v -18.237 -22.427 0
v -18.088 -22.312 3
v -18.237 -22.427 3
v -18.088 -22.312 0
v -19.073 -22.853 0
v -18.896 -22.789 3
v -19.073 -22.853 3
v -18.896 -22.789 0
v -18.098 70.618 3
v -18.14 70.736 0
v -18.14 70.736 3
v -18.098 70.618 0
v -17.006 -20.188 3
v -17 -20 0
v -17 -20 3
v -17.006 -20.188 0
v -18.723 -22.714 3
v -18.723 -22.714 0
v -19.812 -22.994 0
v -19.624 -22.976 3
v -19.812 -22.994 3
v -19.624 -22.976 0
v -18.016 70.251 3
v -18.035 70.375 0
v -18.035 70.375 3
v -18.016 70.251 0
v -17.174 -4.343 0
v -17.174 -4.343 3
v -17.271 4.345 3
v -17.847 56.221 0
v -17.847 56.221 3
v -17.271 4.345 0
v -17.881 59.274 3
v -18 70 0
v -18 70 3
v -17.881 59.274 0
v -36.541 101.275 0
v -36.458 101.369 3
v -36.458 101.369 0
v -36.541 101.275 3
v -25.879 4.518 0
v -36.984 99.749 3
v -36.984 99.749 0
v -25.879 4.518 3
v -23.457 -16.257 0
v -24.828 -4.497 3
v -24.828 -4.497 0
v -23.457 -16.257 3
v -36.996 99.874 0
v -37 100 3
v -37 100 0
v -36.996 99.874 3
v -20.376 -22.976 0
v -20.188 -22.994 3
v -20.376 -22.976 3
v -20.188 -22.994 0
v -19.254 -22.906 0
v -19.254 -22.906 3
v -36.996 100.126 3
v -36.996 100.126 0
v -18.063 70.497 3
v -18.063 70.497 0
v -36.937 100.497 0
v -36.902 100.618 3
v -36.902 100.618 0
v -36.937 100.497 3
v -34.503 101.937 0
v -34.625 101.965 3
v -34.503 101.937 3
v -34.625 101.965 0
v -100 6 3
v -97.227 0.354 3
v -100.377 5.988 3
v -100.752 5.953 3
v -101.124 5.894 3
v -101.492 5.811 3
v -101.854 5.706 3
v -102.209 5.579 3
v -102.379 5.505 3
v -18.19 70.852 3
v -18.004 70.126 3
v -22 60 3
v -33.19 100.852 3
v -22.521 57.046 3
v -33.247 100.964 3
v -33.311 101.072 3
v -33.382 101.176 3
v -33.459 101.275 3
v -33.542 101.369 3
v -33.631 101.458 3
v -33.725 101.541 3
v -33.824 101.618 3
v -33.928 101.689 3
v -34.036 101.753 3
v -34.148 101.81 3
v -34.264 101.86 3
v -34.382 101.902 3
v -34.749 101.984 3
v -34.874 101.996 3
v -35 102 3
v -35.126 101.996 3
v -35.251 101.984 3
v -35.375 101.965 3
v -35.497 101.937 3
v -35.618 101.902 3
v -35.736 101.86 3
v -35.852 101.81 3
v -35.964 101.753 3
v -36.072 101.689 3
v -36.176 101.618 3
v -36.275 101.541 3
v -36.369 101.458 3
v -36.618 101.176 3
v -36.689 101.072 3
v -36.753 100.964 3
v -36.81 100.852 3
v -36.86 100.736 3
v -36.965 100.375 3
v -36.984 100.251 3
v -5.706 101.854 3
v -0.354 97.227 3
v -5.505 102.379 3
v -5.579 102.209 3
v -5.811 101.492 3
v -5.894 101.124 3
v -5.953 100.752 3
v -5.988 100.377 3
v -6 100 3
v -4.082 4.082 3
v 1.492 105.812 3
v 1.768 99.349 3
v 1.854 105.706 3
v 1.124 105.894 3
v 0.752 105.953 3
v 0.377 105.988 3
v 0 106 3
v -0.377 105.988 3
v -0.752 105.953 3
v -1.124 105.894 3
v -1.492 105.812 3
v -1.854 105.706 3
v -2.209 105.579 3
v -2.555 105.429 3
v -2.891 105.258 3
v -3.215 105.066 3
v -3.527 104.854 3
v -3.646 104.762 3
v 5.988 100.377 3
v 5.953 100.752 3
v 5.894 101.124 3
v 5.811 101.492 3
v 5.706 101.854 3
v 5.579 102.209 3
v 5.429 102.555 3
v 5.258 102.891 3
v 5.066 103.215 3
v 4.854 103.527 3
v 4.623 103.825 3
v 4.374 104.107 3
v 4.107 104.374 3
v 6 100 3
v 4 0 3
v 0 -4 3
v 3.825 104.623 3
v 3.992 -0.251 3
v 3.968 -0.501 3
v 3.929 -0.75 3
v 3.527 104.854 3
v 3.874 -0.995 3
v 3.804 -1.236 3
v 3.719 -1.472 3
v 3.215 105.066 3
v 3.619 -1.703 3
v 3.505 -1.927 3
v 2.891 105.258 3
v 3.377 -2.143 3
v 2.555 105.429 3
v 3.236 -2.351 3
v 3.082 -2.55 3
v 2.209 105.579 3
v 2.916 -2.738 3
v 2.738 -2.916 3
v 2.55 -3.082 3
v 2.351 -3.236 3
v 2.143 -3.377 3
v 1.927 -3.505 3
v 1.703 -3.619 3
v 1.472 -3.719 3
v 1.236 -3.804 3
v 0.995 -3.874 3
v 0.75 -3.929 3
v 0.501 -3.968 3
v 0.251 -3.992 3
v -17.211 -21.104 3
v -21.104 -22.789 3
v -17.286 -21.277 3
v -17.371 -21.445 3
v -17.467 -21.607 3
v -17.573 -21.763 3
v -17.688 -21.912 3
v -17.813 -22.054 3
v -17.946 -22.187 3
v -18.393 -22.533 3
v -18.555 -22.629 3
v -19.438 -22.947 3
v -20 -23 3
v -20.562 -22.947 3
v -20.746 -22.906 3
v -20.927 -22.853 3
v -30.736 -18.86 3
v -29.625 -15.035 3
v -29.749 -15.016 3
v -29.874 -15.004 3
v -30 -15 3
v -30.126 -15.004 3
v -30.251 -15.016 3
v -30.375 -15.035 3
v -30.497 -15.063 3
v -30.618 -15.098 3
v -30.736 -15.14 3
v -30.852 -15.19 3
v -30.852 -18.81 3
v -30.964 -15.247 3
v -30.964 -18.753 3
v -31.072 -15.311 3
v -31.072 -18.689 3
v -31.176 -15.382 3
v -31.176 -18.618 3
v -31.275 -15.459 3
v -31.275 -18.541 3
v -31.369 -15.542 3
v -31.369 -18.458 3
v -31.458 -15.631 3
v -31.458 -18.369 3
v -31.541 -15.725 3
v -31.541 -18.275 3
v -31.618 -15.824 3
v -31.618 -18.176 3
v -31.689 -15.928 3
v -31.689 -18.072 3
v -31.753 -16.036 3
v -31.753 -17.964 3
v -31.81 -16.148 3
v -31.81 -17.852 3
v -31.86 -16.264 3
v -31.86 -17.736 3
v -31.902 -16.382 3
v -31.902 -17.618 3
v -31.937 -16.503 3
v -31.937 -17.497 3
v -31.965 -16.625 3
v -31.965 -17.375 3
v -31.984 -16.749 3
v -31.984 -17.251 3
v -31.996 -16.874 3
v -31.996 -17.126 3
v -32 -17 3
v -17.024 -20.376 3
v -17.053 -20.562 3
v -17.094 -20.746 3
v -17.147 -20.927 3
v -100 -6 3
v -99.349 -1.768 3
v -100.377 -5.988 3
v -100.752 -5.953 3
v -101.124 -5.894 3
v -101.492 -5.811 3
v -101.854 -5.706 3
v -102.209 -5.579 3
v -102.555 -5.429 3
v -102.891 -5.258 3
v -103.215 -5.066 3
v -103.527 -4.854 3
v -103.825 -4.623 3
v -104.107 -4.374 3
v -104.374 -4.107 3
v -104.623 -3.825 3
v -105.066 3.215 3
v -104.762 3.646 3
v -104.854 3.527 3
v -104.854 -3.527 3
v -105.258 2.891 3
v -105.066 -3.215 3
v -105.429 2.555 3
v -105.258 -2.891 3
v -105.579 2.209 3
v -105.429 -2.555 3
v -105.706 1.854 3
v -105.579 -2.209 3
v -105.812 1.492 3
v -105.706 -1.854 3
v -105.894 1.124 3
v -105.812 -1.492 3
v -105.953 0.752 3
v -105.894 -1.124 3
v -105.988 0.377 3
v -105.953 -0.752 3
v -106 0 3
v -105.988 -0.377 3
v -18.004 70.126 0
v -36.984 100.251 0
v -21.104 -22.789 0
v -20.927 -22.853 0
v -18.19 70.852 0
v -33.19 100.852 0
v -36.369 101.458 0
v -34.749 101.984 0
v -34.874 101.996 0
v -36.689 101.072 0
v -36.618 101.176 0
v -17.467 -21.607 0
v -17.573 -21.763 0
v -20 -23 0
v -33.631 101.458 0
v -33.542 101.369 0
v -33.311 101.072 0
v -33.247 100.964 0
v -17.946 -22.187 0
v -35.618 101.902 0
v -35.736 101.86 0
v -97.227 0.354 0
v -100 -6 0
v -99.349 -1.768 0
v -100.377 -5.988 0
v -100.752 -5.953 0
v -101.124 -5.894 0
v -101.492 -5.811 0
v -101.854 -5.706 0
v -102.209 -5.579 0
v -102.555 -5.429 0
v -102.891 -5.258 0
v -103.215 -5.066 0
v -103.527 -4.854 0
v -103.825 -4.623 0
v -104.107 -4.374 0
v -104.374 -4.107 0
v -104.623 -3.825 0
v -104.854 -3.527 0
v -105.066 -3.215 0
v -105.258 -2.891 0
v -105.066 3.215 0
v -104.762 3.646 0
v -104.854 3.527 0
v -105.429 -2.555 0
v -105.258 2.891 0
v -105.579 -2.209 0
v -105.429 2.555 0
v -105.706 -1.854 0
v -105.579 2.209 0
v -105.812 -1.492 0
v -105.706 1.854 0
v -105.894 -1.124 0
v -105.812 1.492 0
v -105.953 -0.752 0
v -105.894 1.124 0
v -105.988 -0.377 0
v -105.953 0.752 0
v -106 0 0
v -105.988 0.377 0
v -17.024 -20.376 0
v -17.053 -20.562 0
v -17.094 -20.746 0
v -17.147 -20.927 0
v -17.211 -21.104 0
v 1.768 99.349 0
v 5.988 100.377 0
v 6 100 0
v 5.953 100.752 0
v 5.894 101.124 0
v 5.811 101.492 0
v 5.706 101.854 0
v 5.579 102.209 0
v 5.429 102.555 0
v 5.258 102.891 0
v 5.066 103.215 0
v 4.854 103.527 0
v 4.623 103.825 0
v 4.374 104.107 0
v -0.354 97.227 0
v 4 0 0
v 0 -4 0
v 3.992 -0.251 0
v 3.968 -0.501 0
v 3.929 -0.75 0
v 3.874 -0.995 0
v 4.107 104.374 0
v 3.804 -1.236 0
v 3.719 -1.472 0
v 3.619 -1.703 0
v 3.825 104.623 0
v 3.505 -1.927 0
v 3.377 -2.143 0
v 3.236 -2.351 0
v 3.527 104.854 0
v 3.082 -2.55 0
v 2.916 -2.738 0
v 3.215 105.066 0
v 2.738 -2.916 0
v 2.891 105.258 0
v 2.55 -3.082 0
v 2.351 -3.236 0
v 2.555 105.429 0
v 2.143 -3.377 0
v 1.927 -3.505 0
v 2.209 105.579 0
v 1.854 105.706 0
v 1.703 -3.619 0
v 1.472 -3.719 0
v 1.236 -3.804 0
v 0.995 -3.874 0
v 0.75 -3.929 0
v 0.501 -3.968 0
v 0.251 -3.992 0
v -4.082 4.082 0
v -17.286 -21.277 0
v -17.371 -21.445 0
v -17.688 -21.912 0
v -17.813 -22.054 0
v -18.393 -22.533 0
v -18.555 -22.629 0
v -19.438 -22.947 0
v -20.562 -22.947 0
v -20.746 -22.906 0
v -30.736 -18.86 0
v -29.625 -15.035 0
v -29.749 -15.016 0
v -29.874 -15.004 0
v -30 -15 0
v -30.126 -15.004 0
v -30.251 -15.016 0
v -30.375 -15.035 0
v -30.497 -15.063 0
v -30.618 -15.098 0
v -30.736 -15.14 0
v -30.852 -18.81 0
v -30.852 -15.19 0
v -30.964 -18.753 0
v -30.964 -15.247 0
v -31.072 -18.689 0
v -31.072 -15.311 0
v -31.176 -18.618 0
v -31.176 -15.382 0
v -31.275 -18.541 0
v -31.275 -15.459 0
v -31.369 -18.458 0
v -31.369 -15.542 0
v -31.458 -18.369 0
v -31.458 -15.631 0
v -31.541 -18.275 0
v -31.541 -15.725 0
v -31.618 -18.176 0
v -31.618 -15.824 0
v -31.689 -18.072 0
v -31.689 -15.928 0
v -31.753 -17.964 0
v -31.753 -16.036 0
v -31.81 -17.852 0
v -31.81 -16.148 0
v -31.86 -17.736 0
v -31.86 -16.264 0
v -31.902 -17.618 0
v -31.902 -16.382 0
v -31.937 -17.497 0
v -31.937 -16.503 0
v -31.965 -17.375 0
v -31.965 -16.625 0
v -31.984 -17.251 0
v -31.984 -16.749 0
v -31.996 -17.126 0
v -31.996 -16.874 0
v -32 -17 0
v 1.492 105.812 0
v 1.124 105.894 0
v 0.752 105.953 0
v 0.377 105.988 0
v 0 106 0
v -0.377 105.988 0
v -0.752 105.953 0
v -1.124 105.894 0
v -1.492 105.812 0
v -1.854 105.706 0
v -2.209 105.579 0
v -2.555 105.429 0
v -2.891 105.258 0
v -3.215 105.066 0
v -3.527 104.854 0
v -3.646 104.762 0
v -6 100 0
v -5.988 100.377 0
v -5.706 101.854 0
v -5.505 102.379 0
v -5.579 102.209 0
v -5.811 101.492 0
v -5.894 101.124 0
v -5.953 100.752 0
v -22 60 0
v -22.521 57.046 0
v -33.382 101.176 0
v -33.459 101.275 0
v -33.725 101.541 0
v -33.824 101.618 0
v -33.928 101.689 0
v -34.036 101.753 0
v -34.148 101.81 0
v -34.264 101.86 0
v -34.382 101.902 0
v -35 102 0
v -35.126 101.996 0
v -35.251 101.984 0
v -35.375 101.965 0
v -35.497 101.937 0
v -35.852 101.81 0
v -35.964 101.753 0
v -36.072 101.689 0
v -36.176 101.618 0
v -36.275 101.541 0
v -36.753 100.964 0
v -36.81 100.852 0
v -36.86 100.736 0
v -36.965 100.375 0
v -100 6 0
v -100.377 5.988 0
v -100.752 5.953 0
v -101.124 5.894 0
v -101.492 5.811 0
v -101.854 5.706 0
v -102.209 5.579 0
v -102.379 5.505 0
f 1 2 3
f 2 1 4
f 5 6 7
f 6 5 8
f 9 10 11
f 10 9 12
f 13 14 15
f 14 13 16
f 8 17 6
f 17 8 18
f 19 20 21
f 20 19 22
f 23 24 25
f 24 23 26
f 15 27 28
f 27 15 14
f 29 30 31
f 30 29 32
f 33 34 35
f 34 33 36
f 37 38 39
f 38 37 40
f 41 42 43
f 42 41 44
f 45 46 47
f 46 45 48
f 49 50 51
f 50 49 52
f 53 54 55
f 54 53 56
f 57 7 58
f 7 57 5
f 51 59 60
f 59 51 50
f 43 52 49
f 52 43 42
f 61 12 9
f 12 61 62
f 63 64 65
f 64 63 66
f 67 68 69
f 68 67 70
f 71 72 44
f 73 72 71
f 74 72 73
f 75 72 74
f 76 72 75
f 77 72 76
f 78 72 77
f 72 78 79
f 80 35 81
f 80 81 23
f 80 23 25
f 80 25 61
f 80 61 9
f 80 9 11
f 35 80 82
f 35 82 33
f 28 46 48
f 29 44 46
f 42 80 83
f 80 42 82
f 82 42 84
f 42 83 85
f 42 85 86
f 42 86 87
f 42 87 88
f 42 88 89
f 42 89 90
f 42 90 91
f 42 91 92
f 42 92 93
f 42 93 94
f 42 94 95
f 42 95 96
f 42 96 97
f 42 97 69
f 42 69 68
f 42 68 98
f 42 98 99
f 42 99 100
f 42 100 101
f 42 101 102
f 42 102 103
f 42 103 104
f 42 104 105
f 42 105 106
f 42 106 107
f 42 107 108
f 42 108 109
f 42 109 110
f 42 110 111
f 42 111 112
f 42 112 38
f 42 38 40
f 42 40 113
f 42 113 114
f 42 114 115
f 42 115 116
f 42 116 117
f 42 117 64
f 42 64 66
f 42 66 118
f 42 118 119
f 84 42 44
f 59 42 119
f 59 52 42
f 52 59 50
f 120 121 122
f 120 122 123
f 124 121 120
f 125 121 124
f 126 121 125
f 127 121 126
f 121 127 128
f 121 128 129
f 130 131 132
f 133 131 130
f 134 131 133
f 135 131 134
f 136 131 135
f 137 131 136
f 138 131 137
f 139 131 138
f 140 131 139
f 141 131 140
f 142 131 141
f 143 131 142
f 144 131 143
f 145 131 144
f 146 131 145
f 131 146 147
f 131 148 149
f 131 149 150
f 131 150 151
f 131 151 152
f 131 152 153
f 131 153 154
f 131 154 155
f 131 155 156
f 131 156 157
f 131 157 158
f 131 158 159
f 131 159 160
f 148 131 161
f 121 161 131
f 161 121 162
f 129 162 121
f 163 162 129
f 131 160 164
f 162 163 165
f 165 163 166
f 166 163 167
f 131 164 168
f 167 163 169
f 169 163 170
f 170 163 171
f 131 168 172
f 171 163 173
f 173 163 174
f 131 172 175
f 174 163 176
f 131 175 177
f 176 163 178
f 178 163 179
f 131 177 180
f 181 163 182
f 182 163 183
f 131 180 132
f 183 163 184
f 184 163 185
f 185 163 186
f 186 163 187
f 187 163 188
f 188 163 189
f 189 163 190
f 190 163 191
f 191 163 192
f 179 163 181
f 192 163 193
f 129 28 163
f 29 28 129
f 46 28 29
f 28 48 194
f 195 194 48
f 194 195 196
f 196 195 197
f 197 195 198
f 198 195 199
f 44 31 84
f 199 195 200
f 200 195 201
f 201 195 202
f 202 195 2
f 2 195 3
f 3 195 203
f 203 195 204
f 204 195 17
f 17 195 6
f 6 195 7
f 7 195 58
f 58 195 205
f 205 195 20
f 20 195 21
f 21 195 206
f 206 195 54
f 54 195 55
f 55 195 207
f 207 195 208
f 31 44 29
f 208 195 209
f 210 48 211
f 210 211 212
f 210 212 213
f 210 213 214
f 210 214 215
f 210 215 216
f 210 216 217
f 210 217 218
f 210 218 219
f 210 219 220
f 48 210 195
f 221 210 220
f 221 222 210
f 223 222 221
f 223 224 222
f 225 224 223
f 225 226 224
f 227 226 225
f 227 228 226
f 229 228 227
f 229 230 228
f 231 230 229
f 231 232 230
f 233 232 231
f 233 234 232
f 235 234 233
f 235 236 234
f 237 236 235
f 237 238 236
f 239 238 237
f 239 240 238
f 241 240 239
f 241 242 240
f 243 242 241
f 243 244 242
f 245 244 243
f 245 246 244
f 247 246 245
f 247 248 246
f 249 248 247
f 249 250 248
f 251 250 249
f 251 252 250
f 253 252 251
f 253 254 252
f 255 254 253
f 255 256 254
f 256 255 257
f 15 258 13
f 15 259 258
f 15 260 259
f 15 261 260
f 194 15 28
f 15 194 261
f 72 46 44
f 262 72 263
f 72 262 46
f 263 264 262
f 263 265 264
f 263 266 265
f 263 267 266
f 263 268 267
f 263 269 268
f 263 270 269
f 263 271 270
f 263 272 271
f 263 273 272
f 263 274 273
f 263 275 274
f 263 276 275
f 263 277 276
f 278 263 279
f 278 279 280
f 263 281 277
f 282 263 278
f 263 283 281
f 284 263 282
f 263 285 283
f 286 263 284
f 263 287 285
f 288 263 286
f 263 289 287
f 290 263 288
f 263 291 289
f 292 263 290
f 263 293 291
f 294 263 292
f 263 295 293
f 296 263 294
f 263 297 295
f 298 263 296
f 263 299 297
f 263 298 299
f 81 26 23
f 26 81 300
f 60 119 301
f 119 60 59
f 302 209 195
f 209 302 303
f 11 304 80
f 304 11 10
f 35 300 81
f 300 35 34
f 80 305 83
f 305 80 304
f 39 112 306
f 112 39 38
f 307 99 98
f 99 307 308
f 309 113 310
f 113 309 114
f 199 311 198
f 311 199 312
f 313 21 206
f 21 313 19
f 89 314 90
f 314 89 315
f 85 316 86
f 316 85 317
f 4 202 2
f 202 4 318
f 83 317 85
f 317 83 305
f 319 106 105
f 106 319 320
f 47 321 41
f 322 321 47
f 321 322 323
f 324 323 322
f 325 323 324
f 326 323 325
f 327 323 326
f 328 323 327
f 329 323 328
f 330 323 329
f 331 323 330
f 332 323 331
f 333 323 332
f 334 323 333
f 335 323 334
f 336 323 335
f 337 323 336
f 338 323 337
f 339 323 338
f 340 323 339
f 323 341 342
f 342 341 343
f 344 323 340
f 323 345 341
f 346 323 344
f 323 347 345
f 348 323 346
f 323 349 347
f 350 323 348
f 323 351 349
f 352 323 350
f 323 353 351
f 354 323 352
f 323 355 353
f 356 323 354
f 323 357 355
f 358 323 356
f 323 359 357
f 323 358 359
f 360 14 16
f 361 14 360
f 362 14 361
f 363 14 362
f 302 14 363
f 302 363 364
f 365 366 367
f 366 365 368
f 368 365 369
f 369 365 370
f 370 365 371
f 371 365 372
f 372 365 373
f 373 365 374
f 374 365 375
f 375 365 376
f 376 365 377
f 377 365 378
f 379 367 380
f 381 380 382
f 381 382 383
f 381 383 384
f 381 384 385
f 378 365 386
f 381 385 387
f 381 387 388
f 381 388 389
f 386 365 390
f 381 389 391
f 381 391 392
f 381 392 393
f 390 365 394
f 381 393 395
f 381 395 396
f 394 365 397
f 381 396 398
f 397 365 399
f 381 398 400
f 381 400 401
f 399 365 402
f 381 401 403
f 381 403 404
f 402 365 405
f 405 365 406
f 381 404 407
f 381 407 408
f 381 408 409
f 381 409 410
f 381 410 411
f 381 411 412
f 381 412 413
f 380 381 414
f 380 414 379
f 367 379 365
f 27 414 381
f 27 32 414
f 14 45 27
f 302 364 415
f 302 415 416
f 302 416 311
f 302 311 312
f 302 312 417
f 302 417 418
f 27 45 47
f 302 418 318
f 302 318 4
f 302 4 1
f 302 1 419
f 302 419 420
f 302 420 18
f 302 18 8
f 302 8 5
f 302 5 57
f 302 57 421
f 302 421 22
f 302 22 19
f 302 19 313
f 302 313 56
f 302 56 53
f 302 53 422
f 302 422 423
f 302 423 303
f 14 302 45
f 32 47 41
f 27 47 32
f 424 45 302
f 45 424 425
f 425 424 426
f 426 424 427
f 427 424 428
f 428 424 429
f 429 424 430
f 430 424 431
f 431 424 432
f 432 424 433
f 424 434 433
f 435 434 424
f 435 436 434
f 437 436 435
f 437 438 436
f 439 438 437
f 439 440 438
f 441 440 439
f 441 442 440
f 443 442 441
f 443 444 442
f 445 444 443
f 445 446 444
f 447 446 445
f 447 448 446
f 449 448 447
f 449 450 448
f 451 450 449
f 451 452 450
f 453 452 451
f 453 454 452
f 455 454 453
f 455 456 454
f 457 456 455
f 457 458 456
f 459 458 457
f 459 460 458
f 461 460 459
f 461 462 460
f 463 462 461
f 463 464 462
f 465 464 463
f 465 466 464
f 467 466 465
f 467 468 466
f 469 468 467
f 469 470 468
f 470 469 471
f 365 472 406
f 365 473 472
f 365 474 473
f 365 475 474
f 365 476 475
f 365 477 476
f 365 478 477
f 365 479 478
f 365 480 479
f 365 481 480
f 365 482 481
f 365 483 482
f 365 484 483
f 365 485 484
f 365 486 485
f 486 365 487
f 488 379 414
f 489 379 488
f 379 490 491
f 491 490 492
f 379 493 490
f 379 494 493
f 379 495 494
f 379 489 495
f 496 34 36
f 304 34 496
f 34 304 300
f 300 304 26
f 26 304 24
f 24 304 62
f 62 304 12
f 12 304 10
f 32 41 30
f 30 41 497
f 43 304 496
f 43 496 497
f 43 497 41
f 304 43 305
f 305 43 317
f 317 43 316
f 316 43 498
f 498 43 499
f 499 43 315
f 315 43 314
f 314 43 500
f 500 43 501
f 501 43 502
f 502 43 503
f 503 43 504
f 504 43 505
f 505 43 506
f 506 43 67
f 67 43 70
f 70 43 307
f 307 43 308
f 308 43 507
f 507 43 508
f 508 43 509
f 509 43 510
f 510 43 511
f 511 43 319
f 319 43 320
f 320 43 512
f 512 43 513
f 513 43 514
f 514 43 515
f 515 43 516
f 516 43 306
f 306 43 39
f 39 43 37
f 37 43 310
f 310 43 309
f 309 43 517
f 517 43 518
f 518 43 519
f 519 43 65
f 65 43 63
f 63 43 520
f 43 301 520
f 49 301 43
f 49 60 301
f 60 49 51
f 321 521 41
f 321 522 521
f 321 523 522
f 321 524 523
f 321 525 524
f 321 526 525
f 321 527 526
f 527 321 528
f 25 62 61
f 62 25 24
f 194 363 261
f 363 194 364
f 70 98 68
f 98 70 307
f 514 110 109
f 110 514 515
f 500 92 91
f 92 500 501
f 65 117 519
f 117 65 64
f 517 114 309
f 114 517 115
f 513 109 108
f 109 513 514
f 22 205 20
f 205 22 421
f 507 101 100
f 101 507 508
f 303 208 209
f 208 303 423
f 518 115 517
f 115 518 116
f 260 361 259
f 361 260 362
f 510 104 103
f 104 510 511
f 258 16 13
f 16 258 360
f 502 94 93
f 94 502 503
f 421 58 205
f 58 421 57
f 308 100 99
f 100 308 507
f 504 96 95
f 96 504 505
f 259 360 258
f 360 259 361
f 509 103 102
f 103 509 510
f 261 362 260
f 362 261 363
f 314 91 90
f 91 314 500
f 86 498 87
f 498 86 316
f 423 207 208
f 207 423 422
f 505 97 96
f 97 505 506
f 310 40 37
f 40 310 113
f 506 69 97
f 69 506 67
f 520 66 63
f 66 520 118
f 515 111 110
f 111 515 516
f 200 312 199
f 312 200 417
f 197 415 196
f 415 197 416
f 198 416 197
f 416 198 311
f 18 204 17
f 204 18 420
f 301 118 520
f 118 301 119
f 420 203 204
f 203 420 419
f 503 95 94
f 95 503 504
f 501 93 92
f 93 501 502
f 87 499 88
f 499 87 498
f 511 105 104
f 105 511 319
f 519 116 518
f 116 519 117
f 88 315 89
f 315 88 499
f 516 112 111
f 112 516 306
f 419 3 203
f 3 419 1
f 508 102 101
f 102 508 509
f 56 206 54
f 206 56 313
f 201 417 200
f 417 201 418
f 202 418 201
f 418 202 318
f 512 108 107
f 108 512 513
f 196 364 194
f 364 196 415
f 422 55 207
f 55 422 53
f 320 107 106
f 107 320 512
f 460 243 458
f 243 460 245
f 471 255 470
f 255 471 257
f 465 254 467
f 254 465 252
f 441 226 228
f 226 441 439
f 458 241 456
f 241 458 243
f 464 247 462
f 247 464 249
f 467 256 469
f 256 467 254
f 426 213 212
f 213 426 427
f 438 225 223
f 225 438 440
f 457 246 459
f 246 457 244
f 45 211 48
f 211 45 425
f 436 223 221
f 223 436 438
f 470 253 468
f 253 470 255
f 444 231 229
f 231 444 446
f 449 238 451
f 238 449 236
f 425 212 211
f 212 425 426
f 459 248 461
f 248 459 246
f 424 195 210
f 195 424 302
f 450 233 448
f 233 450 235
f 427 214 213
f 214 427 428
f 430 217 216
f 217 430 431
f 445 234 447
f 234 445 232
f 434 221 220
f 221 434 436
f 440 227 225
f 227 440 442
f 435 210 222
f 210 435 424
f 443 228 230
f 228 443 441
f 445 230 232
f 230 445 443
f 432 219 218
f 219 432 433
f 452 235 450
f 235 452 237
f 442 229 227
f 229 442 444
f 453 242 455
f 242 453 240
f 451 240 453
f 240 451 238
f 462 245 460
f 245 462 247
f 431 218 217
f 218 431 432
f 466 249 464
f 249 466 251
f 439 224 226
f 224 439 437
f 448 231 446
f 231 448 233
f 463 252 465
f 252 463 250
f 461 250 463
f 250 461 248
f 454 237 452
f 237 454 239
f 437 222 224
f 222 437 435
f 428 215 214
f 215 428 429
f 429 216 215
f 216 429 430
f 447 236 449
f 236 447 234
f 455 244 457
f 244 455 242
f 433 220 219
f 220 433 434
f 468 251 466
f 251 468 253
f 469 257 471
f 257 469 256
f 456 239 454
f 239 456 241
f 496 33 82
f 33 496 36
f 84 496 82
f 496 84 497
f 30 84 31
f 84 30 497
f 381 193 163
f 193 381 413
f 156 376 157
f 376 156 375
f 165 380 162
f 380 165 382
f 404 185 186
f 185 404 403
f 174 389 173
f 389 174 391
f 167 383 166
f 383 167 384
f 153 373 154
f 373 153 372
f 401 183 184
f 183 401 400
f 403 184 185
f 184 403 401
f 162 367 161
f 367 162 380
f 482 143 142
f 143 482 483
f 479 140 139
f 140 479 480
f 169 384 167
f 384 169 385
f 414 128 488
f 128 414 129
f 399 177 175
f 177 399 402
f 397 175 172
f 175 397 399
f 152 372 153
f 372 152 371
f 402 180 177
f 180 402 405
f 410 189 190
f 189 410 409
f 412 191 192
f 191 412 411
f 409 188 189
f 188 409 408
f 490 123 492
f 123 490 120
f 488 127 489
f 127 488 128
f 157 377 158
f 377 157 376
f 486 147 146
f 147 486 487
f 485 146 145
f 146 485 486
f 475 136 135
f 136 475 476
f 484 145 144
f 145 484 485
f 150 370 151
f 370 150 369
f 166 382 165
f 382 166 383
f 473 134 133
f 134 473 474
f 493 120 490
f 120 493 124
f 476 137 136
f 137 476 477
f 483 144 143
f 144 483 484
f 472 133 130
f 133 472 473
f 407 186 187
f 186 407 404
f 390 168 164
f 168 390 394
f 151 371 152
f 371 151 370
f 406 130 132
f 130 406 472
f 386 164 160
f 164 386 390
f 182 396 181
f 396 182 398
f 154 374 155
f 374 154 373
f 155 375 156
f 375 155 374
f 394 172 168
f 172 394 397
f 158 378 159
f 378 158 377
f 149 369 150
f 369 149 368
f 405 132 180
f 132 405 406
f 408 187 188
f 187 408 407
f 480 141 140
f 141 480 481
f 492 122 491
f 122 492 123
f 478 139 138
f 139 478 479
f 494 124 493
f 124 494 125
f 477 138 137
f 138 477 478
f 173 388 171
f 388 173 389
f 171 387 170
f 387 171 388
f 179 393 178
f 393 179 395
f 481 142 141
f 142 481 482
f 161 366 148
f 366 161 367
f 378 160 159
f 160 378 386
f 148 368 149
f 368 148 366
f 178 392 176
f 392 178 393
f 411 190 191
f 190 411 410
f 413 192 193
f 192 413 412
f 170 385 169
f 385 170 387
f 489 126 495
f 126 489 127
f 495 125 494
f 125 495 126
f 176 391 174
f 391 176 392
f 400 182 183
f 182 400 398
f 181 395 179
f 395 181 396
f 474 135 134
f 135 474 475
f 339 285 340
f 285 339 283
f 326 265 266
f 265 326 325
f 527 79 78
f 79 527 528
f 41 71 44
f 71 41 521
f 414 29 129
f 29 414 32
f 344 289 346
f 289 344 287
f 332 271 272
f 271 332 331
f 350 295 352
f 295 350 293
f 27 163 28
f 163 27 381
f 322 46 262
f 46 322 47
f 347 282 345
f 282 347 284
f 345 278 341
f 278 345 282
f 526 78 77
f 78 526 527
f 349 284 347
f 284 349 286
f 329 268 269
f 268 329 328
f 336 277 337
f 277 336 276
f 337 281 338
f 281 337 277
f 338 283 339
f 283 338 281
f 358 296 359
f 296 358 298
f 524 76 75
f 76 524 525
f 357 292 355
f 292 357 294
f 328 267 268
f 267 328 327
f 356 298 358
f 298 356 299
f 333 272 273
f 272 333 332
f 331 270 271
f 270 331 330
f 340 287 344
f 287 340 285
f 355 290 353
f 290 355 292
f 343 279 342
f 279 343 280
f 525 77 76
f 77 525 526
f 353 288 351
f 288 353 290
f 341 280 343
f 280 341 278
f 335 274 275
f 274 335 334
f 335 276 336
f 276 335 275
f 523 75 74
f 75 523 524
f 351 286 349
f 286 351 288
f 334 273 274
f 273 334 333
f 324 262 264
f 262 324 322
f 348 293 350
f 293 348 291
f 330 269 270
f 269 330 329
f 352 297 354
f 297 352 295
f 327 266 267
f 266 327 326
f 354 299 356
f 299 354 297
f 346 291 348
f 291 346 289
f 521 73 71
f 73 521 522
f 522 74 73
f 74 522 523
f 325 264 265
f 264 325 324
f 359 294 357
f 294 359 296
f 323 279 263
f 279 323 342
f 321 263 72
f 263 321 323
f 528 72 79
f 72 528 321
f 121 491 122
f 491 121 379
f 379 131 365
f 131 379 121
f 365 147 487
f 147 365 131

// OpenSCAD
/*
	some info
*/

//	variables
QUALITY = 100;
RADIUS = 2;
MULTI = 1;
THICKNESS = 3;

// tests
module arm(){
	difference(){
	union(){
		color("green")hull(){
			translate([0,0,0])cylinder(h=THICKNESS, r=(RADIUS+MULTI), $fn=QUALITY);
			translate([90,0,0])cylinder(h=THICKNESS, r=RADIUS, $fn=QUALITY);
			translate([120,15,0])cylinder(h=THICKNESS, r=RADIUS, $fn=QUALITY);
		}
		color("cyan")hull(){
			translate([3,10,0])cylinder(h=THICKNESS, r=RADIUS, $fn=QUALITY);
			translate([0,0,0])cylinder(h=THICKNESS, r=(RADIUS+MULTI), $fn=QUALITY);
		}
	}
	color("red")translate([80,2,(THICKNESS-THICKNESS*1.5)])rotate([0,0,170])cube([THICKNESS, (THICKNESS*2), (THICKNESS*2)]);
	}
}

module cutout(x,y,z=(THICKNESS-THICKNESS*1.5)){
	translate([x,y,(z*1.2)])cube([THICKNESS, (THICKNESS*4), (THICKNESS*4)], center=true);
}

module try(){
	hull(){
		translate([0,0,0])cylinder(h=THICKNESS, r=(RADIUS*2), $fn=QUALITY);
		translate([0,100,0])cylinder(h=THICKNESS, r=(RADIUS*3), $fn=QUALITY);
	}
}
module tripod(z){
difference(){
	color("green"){
		rotate([0,0,0])try();
		rotate([0,0,90])try();
	}
	color("yellow")rotate([0,0,45]){cutout(-70,75,z);}
	color("yellow")rotate([0,0,45]){cutout(70,75,z);}
	}
}

module render(){
  translate([-20, -20, 0])rotate(90)arm();
	translate([0,0])tripod(0);
}
render();
